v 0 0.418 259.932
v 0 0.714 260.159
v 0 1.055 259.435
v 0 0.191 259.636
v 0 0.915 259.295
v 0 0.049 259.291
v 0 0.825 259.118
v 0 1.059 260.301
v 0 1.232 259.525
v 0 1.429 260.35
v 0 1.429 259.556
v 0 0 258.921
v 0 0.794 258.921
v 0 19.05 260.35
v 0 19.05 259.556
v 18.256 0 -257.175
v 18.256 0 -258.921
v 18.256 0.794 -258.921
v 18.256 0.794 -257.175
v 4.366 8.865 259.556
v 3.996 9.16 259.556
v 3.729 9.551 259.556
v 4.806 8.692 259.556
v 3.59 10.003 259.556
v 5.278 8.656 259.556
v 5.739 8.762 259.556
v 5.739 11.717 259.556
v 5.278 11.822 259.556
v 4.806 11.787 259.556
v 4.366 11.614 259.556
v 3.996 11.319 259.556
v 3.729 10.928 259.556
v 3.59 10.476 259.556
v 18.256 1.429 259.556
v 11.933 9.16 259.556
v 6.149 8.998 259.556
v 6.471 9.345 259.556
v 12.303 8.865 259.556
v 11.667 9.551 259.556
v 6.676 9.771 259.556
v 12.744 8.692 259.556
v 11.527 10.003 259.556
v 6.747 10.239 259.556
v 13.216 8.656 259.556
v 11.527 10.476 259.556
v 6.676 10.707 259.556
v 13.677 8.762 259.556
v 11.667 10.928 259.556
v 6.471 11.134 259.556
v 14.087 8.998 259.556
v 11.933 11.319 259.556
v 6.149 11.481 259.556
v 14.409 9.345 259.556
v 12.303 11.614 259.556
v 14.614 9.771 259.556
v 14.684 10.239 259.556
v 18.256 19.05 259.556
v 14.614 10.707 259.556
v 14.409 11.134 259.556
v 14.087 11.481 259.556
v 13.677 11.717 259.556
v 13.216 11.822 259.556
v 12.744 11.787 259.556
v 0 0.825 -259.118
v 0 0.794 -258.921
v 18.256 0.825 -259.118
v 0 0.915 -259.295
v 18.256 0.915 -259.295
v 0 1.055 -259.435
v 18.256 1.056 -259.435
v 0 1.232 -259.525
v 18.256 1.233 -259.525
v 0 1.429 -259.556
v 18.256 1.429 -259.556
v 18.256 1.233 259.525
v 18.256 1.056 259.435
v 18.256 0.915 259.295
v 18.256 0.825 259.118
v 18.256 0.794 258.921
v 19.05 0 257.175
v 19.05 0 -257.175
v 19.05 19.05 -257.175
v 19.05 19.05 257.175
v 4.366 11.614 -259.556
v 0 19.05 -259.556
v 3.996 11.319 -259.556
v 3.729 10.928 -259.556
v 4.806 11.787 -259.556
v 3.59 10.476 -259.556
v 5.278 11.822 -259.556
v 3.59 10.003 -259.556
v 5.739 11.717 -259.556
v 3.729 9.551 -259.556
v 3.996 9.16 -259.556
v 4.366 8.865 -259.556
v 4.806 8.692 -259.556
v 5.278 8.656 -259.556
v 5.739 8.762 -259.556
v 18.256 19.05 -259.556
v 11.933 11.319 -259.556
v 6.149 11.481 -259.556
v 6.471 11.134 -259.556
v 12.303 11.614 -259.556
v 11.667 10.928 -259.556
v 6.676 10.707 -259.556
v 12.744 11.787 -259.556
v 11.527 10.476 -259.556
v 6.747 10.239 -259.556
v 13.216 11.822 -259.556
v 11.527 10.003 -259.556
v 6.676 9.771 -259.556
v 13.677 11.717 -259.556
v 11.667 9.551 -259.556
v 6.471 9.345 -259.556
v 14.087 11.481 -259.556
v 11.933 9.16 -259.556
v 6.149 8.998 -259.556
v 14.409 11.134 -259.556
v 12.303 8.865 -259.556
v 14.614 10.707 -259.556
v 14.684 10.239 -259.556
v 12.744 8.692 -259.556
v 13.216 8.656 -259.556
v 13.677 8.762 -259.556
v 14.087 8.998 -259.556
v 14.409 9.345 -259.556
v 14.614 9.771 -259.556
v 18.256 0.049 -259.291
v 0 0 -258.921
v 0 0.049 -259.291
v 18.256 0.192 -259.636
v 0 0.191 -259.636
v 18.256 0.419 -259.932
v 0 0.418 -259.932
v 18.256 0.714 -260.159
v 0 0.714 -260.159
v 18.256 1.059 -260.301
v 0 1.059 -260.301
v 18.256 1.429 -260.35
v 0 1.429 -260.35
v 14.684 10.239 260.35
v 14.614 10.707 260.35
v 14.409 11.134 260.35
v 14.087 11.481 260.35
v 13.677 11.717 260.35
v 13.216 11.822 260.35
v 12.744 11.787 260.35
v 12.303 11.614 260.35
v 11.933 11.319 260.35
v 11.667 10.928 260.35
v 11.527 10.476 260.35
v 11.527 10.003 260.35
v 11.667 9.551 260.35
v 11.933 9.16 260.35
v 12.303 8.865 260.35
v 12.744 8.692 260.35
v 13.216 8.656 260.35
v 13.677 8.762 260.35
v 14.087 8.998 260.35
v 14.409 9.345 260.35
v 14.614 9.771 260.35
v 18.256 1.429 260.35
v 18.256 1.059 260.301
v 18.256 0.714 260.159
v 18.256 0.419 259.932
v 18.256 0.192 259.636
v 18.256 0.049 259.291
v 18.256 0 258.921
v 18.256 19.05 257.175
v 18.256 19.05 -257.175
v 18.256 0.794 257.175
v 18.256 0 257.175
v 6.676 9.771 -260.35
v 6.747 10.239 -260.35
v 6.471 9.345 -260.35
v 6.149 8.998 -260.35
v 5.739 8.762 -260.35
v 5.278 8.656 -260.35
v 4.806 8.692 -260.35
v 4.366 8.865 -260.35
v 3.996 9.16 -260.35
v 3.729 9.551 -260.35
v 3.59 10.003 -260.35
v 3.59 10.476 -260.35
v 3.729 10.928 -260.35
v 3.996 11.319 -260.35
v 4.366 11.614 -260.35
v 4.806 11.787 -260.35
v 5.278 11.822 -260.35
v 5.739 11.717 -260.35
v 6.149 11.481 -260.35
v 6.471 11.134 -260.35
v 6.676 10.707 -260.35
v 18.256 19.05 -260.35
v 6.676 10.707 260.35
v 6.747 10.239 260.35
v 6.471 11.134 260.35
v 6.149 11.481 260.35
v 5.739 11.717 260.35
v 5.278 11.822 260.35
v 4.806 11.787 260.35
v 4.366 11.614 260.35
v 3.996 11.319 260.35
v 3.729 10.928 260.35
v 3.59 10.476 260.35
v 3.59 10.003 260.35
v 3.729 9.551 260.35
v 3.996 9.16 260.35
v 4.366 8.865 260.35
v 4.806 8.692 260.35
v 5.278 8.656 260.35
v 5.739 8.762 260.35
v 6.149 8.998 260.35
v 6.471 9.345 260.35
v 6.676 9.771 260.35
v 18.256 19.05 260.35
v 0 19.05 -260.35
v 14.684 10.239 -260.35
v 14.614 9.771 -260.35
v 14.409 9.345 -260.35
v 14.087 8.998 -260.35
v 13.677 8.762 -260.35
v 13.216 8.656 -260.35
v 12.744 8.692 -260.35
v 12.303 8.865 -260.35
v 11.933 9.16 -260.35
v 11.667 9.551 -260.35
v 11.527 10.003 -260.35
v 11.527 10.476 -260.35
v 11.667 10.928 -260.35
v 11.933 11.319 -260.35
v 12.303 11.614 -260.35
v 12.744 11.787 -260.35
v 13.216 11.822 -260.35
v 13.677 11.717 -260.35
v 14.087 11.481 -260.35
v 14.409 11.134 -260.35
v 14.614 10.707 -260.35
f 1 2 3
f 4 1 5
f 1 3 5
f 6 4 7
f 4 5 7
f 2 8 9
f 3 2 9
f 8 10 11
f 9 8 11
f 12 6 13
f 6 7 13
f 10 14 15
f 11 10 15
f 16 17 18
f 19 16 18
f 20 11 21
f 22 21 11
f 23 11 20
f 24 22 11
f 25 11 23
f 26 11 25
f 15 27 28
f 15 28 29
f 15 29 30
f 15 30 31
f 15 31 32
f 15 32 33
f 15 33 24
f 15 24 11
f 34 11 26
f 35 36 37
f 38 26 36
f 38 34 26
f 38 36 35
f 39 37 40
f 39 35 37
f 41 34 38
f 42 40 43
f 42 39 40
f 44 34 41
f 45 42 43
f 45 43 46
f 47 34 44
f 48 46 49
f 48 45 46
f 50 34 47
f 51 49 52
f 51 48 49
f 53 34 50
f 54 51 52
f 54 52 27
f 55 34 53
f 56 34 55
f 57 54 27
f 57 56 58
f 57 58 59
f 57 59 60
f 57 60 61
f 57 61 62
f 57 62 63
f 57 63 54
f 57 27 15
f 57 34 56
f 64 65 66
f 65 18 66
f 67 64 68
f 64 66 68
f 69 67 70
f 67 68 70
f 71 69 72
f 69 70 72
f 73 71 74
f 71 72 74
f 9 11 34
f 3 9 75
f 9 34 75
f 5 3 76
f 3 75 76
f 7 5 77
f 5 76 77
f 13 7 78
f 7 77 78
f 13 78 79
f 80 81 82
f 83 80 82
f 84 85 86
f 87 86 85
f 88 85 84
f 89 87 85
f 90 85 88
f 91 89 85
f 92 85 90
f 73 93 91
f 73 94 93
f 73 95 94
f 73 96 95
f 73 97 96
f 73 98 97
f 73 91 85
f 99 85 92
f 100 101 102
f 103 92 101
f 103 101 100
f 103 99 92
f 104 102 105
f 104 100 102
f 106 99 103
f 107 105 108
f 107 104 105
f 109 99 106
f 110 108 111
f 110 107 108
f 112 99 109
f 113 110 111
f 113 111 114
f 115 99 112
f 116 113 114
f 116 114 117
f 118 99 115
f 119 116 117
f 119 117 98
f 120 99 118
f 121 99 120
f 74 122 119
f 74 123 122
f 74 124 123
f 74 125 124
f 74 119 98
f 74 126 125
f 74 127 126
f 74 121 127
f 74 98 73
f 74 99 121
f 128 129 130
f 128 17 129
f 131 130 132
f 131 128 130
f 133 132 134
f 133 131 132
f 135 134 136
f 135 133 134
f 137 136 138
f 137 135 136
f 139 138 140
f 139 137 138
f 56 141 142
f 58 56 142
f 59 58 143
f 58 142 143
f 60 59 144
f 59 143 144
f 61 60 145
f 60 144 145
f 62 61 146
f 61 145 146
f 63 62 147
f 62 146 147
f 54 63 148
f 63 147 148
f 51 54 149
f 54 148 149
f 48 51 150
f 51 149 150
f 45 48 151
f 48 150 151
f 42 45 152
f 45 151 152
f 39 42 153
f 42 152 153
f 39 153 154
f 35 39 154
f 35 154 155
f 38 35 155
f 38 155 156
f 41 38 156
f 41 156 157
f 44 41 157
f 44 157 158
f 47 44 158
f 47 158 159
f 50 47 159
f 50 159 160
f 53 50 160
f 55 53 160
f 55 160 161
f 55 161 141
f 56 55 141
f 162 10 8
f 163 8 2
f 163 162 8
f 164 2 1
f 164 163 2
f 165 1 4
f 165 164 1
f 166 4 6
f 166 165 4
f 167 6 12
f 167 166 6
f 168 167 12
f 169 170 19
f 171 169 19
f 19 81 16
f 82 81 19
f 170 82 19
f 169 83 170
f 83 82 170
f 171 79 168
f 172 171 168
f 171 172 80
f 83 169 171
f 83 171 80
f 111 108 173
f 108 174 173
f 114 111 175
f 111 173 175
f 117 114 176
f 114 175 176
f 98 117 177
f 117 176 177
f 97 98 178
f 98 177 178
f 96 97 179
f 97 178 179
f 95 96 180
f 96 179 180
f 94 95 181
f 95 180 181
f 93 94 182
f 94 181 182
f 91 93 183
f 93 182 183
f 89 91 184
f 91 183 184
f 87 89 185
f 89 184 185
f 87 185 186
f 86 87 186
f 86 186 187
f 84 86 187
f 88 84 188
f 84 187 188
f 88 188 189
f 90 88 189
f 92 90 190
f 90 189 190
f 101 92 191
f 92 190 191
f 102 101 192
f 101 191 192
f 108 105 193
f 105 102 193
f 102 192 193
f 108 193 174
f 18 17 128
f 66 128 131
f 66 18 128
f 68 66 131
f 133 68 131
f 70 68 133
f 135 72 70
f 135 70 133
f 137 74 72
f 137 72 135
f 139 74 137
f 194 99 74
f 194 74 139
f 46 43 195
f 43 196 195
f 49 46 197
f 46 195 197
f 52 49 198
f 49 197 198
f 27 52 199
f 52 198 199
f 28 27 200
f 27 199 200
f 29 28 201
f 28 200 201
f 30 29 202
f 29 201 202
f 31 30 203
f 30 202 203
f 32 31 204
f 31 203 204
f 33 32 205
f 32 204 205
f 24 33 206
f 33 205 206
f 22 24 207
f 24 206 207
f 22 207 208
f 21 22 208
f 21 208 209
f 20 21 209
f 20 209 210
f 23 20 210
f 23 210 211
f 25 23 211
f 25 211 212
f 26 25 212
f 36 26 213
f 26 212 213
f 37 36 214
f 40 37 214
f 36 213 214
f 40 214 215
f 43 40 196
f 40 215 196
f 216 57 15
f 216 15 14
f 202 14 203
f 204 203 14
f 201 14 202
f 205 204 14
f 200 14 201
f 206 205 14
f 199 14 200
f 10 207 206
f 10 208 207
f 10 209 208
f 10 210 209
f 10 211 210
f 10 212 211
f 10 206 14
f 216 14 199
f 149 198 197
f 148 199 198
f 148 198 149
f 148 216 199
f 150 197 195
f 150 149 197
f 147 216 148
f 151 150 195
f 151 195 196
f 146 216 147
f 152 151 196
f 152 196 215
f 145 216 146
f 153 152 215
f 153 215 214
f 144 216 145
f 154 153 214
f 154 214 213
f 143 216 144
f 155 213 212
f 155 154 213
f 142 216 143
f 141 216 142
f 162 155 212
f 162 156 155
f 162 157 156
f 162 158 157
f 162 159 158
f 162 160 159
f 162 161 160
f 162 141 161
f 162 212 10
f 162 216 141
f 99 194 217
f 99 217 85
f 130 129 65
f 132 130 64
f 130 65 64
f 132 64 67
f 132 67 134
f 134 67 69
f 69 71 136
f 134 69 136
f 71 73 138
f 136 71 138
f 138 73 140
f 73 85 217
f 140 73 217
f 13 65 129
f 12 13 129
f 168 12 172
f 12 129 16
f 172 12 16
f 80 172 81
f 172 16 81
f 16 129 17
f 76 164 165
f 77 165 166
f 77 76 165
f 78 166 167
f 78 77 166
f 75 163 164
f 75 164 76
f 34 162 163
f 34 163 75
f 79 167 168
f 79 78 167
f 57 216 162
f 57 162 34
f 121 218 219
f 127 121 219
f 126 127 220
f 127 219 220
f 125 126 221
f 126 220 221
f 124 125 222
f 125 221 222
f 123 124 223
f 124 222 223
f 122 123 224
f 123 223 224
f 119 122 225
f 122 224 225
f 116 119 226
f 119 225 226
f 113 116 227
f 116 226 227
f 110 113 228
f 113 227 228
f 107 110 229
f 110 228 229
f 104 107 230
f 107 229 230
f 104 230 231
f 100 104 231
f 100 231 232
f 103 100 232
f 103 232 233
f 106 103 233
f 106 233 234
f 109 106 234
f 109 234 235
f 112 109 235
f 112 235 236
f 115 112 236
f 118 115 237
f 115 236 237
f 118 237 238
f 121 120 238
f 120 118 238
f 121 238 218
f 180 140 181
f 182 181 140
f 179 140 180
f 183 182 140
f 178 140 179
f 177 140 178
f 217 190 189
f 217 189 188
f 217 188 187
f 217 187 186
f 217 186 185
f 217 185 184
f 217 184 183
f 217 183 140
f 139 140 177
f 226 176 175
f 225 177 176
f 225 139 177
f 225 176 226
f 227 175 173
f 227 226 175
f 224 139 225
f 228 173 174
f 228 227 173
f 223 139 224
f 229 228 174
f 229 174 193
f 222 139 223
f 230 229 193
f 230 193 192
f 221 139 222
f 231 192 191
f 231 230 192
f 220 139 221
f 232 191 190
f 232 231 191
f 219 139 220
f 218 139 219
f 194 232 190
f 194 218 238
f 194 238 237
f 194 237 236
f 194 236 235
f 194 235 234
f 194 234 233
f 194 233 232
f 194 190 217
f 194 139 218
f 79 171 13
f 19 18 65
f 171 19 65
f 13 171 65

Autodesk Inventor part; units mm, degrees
ref_plane "YZ Plane" through (0, 0, 0) normal (1, 0, 0) x (0, 1, 0)
ref_plane "XZ Plane" through (0, 0, 0) normal (0, 1, 0) x (-1, 0, 0)
ref_plane "XY Plane" through (0, 0, 0) normal (0, 0, 1) x (1, 0, 0)
sketch "Sketch1" plane through (0, 0, 0) normal (0, 0, 1) x (1, 0, 0)
  line L0 (0, 0) -> (19.05, 0)
  line L1 (19.05, 0) -> (19.05, 19.05)
  line L2 (19.05, 19.05) -> (18.2563, 19.05)
  line L3 (18.2563, 19.05) -> (18.2563, 0.7938)
  line L4 (18.2563, 0.7938) -> (0, 0.7937)
  line L5 (0, 0.7937) -> (0, 0)
  dimension "d0" = 19.05
  dimension "d1" = 19.05
  dimension "d2" = 0.7937
extrude "Extrusion1" add sketch "Sketch1" along normal blind 260.35
sketch "Sketch2" plane through (0, 0, 260.35) normal (0, 0, 1) x (1, 0, 0)
  line L0 (0, 0) -> (19.05, 0) projected
  line L1 (19.05, 0) -> (19.05, 19.05) projected
  line L2 (19.05, 19.05) -> (18.2563, 19.05) projected
  line L3 (18.2563, 19.05) -> (18.2563, 0.7938) projected
  line L4 (18.2563, 0.7938) -> (18.2563, 0)
extrude "Extrusion2" cut sketch "Sketch2" against normal blind 3.175
sketch "Sketch3" plane through (18.2563, 0, 259.5563) normal (0, 0, 1) x (1, 0, 0)
  line L0 (-18.2563, 0) -> (0, 0)
  line L1 (0, 0) -> (0, 19.05)
  line L2 (0, 19.05) -> (-18.2563, 19.05)
  line L3 (-18.2563, 19.05) -> (-18.2563, 0)
edge flange "Flange1" height 19.05 angle 90 thickness 0.7937 bend radius 0.635 thickness toward (0, 0, 1) relief straight relief width 0.7937 relief depth 0.3969 edges at (9.1281, 0.7938, 260.35) wall of the first edge with corners at (0, 0, 259.5563) (18.2563, 0, 259.5563) (18.2562, 19.05, 259.5563) (0, 19.05, 259.5563)
bend "Bend1"
corner "Corner1"
sketch "Sketch4" plane through (0, 19.05, 260.35) normal (0, 0, 1) x (1, 0, 0)
  line L0 (0, -17.6213) -> (18.2563, -17.6213) projected
  line L1 (0, 0) -> (18.2563, 0) projected
  circle A0 centre (5.1594, -8.8106) radius 1.5875
  circle A1 centre (13.0969, -8.8106) radius 1.5875
  line L2 (5.1594, -8.8106) -> (13.0969, -8.8106) construction
  line L3 (9.1281, 0) -> (9.1281, -17.6213) construction
  point P0 (0, -19.05)
  point P1 (9.1281, -8.8106)
  dimension "d21" = 3.175
  dimension "d22" = 7.9375
extrude "Extrusion3" cut sketch "Sketch4" against normal through all
mirror "Mirror1" about plane through (13.8989, 5.1511, 0) normal (0, 0, -1)
equation "\"d7\" = BendReliefWidth"
equation "\"d8\" = BendReliefDepth"
equation "\"d9\" = MinimumRemnant"
equation "\"d10\" = BendRadius"
equation "\"d14\" = CornerReliefSize"
equation "\"d15\" = GapSize"
equation "\"d16\" = JacobiRadiusSize"
equation "\"BendRadius\" = Thickness"
equation "\"BendReliefWidth\" = Thickness"
equation "\"BendReliefDepth\" = 0.5 * Thickness"
equation "\"CornerReliefSize\" = 4 * Thickness"
equation "\"MinimumRemnant\" = 2 * Thickness"
equation "\"TransitionRadius\" = BendRadius"
equation "\"JacobiRadiusSize\" = Thickness"
equation "\"GapSize\" = Thickness"
equation "\"Thickness\" = 0.79375"
properties part number "Climber Connector Bar" material "Aluminum 6061"
